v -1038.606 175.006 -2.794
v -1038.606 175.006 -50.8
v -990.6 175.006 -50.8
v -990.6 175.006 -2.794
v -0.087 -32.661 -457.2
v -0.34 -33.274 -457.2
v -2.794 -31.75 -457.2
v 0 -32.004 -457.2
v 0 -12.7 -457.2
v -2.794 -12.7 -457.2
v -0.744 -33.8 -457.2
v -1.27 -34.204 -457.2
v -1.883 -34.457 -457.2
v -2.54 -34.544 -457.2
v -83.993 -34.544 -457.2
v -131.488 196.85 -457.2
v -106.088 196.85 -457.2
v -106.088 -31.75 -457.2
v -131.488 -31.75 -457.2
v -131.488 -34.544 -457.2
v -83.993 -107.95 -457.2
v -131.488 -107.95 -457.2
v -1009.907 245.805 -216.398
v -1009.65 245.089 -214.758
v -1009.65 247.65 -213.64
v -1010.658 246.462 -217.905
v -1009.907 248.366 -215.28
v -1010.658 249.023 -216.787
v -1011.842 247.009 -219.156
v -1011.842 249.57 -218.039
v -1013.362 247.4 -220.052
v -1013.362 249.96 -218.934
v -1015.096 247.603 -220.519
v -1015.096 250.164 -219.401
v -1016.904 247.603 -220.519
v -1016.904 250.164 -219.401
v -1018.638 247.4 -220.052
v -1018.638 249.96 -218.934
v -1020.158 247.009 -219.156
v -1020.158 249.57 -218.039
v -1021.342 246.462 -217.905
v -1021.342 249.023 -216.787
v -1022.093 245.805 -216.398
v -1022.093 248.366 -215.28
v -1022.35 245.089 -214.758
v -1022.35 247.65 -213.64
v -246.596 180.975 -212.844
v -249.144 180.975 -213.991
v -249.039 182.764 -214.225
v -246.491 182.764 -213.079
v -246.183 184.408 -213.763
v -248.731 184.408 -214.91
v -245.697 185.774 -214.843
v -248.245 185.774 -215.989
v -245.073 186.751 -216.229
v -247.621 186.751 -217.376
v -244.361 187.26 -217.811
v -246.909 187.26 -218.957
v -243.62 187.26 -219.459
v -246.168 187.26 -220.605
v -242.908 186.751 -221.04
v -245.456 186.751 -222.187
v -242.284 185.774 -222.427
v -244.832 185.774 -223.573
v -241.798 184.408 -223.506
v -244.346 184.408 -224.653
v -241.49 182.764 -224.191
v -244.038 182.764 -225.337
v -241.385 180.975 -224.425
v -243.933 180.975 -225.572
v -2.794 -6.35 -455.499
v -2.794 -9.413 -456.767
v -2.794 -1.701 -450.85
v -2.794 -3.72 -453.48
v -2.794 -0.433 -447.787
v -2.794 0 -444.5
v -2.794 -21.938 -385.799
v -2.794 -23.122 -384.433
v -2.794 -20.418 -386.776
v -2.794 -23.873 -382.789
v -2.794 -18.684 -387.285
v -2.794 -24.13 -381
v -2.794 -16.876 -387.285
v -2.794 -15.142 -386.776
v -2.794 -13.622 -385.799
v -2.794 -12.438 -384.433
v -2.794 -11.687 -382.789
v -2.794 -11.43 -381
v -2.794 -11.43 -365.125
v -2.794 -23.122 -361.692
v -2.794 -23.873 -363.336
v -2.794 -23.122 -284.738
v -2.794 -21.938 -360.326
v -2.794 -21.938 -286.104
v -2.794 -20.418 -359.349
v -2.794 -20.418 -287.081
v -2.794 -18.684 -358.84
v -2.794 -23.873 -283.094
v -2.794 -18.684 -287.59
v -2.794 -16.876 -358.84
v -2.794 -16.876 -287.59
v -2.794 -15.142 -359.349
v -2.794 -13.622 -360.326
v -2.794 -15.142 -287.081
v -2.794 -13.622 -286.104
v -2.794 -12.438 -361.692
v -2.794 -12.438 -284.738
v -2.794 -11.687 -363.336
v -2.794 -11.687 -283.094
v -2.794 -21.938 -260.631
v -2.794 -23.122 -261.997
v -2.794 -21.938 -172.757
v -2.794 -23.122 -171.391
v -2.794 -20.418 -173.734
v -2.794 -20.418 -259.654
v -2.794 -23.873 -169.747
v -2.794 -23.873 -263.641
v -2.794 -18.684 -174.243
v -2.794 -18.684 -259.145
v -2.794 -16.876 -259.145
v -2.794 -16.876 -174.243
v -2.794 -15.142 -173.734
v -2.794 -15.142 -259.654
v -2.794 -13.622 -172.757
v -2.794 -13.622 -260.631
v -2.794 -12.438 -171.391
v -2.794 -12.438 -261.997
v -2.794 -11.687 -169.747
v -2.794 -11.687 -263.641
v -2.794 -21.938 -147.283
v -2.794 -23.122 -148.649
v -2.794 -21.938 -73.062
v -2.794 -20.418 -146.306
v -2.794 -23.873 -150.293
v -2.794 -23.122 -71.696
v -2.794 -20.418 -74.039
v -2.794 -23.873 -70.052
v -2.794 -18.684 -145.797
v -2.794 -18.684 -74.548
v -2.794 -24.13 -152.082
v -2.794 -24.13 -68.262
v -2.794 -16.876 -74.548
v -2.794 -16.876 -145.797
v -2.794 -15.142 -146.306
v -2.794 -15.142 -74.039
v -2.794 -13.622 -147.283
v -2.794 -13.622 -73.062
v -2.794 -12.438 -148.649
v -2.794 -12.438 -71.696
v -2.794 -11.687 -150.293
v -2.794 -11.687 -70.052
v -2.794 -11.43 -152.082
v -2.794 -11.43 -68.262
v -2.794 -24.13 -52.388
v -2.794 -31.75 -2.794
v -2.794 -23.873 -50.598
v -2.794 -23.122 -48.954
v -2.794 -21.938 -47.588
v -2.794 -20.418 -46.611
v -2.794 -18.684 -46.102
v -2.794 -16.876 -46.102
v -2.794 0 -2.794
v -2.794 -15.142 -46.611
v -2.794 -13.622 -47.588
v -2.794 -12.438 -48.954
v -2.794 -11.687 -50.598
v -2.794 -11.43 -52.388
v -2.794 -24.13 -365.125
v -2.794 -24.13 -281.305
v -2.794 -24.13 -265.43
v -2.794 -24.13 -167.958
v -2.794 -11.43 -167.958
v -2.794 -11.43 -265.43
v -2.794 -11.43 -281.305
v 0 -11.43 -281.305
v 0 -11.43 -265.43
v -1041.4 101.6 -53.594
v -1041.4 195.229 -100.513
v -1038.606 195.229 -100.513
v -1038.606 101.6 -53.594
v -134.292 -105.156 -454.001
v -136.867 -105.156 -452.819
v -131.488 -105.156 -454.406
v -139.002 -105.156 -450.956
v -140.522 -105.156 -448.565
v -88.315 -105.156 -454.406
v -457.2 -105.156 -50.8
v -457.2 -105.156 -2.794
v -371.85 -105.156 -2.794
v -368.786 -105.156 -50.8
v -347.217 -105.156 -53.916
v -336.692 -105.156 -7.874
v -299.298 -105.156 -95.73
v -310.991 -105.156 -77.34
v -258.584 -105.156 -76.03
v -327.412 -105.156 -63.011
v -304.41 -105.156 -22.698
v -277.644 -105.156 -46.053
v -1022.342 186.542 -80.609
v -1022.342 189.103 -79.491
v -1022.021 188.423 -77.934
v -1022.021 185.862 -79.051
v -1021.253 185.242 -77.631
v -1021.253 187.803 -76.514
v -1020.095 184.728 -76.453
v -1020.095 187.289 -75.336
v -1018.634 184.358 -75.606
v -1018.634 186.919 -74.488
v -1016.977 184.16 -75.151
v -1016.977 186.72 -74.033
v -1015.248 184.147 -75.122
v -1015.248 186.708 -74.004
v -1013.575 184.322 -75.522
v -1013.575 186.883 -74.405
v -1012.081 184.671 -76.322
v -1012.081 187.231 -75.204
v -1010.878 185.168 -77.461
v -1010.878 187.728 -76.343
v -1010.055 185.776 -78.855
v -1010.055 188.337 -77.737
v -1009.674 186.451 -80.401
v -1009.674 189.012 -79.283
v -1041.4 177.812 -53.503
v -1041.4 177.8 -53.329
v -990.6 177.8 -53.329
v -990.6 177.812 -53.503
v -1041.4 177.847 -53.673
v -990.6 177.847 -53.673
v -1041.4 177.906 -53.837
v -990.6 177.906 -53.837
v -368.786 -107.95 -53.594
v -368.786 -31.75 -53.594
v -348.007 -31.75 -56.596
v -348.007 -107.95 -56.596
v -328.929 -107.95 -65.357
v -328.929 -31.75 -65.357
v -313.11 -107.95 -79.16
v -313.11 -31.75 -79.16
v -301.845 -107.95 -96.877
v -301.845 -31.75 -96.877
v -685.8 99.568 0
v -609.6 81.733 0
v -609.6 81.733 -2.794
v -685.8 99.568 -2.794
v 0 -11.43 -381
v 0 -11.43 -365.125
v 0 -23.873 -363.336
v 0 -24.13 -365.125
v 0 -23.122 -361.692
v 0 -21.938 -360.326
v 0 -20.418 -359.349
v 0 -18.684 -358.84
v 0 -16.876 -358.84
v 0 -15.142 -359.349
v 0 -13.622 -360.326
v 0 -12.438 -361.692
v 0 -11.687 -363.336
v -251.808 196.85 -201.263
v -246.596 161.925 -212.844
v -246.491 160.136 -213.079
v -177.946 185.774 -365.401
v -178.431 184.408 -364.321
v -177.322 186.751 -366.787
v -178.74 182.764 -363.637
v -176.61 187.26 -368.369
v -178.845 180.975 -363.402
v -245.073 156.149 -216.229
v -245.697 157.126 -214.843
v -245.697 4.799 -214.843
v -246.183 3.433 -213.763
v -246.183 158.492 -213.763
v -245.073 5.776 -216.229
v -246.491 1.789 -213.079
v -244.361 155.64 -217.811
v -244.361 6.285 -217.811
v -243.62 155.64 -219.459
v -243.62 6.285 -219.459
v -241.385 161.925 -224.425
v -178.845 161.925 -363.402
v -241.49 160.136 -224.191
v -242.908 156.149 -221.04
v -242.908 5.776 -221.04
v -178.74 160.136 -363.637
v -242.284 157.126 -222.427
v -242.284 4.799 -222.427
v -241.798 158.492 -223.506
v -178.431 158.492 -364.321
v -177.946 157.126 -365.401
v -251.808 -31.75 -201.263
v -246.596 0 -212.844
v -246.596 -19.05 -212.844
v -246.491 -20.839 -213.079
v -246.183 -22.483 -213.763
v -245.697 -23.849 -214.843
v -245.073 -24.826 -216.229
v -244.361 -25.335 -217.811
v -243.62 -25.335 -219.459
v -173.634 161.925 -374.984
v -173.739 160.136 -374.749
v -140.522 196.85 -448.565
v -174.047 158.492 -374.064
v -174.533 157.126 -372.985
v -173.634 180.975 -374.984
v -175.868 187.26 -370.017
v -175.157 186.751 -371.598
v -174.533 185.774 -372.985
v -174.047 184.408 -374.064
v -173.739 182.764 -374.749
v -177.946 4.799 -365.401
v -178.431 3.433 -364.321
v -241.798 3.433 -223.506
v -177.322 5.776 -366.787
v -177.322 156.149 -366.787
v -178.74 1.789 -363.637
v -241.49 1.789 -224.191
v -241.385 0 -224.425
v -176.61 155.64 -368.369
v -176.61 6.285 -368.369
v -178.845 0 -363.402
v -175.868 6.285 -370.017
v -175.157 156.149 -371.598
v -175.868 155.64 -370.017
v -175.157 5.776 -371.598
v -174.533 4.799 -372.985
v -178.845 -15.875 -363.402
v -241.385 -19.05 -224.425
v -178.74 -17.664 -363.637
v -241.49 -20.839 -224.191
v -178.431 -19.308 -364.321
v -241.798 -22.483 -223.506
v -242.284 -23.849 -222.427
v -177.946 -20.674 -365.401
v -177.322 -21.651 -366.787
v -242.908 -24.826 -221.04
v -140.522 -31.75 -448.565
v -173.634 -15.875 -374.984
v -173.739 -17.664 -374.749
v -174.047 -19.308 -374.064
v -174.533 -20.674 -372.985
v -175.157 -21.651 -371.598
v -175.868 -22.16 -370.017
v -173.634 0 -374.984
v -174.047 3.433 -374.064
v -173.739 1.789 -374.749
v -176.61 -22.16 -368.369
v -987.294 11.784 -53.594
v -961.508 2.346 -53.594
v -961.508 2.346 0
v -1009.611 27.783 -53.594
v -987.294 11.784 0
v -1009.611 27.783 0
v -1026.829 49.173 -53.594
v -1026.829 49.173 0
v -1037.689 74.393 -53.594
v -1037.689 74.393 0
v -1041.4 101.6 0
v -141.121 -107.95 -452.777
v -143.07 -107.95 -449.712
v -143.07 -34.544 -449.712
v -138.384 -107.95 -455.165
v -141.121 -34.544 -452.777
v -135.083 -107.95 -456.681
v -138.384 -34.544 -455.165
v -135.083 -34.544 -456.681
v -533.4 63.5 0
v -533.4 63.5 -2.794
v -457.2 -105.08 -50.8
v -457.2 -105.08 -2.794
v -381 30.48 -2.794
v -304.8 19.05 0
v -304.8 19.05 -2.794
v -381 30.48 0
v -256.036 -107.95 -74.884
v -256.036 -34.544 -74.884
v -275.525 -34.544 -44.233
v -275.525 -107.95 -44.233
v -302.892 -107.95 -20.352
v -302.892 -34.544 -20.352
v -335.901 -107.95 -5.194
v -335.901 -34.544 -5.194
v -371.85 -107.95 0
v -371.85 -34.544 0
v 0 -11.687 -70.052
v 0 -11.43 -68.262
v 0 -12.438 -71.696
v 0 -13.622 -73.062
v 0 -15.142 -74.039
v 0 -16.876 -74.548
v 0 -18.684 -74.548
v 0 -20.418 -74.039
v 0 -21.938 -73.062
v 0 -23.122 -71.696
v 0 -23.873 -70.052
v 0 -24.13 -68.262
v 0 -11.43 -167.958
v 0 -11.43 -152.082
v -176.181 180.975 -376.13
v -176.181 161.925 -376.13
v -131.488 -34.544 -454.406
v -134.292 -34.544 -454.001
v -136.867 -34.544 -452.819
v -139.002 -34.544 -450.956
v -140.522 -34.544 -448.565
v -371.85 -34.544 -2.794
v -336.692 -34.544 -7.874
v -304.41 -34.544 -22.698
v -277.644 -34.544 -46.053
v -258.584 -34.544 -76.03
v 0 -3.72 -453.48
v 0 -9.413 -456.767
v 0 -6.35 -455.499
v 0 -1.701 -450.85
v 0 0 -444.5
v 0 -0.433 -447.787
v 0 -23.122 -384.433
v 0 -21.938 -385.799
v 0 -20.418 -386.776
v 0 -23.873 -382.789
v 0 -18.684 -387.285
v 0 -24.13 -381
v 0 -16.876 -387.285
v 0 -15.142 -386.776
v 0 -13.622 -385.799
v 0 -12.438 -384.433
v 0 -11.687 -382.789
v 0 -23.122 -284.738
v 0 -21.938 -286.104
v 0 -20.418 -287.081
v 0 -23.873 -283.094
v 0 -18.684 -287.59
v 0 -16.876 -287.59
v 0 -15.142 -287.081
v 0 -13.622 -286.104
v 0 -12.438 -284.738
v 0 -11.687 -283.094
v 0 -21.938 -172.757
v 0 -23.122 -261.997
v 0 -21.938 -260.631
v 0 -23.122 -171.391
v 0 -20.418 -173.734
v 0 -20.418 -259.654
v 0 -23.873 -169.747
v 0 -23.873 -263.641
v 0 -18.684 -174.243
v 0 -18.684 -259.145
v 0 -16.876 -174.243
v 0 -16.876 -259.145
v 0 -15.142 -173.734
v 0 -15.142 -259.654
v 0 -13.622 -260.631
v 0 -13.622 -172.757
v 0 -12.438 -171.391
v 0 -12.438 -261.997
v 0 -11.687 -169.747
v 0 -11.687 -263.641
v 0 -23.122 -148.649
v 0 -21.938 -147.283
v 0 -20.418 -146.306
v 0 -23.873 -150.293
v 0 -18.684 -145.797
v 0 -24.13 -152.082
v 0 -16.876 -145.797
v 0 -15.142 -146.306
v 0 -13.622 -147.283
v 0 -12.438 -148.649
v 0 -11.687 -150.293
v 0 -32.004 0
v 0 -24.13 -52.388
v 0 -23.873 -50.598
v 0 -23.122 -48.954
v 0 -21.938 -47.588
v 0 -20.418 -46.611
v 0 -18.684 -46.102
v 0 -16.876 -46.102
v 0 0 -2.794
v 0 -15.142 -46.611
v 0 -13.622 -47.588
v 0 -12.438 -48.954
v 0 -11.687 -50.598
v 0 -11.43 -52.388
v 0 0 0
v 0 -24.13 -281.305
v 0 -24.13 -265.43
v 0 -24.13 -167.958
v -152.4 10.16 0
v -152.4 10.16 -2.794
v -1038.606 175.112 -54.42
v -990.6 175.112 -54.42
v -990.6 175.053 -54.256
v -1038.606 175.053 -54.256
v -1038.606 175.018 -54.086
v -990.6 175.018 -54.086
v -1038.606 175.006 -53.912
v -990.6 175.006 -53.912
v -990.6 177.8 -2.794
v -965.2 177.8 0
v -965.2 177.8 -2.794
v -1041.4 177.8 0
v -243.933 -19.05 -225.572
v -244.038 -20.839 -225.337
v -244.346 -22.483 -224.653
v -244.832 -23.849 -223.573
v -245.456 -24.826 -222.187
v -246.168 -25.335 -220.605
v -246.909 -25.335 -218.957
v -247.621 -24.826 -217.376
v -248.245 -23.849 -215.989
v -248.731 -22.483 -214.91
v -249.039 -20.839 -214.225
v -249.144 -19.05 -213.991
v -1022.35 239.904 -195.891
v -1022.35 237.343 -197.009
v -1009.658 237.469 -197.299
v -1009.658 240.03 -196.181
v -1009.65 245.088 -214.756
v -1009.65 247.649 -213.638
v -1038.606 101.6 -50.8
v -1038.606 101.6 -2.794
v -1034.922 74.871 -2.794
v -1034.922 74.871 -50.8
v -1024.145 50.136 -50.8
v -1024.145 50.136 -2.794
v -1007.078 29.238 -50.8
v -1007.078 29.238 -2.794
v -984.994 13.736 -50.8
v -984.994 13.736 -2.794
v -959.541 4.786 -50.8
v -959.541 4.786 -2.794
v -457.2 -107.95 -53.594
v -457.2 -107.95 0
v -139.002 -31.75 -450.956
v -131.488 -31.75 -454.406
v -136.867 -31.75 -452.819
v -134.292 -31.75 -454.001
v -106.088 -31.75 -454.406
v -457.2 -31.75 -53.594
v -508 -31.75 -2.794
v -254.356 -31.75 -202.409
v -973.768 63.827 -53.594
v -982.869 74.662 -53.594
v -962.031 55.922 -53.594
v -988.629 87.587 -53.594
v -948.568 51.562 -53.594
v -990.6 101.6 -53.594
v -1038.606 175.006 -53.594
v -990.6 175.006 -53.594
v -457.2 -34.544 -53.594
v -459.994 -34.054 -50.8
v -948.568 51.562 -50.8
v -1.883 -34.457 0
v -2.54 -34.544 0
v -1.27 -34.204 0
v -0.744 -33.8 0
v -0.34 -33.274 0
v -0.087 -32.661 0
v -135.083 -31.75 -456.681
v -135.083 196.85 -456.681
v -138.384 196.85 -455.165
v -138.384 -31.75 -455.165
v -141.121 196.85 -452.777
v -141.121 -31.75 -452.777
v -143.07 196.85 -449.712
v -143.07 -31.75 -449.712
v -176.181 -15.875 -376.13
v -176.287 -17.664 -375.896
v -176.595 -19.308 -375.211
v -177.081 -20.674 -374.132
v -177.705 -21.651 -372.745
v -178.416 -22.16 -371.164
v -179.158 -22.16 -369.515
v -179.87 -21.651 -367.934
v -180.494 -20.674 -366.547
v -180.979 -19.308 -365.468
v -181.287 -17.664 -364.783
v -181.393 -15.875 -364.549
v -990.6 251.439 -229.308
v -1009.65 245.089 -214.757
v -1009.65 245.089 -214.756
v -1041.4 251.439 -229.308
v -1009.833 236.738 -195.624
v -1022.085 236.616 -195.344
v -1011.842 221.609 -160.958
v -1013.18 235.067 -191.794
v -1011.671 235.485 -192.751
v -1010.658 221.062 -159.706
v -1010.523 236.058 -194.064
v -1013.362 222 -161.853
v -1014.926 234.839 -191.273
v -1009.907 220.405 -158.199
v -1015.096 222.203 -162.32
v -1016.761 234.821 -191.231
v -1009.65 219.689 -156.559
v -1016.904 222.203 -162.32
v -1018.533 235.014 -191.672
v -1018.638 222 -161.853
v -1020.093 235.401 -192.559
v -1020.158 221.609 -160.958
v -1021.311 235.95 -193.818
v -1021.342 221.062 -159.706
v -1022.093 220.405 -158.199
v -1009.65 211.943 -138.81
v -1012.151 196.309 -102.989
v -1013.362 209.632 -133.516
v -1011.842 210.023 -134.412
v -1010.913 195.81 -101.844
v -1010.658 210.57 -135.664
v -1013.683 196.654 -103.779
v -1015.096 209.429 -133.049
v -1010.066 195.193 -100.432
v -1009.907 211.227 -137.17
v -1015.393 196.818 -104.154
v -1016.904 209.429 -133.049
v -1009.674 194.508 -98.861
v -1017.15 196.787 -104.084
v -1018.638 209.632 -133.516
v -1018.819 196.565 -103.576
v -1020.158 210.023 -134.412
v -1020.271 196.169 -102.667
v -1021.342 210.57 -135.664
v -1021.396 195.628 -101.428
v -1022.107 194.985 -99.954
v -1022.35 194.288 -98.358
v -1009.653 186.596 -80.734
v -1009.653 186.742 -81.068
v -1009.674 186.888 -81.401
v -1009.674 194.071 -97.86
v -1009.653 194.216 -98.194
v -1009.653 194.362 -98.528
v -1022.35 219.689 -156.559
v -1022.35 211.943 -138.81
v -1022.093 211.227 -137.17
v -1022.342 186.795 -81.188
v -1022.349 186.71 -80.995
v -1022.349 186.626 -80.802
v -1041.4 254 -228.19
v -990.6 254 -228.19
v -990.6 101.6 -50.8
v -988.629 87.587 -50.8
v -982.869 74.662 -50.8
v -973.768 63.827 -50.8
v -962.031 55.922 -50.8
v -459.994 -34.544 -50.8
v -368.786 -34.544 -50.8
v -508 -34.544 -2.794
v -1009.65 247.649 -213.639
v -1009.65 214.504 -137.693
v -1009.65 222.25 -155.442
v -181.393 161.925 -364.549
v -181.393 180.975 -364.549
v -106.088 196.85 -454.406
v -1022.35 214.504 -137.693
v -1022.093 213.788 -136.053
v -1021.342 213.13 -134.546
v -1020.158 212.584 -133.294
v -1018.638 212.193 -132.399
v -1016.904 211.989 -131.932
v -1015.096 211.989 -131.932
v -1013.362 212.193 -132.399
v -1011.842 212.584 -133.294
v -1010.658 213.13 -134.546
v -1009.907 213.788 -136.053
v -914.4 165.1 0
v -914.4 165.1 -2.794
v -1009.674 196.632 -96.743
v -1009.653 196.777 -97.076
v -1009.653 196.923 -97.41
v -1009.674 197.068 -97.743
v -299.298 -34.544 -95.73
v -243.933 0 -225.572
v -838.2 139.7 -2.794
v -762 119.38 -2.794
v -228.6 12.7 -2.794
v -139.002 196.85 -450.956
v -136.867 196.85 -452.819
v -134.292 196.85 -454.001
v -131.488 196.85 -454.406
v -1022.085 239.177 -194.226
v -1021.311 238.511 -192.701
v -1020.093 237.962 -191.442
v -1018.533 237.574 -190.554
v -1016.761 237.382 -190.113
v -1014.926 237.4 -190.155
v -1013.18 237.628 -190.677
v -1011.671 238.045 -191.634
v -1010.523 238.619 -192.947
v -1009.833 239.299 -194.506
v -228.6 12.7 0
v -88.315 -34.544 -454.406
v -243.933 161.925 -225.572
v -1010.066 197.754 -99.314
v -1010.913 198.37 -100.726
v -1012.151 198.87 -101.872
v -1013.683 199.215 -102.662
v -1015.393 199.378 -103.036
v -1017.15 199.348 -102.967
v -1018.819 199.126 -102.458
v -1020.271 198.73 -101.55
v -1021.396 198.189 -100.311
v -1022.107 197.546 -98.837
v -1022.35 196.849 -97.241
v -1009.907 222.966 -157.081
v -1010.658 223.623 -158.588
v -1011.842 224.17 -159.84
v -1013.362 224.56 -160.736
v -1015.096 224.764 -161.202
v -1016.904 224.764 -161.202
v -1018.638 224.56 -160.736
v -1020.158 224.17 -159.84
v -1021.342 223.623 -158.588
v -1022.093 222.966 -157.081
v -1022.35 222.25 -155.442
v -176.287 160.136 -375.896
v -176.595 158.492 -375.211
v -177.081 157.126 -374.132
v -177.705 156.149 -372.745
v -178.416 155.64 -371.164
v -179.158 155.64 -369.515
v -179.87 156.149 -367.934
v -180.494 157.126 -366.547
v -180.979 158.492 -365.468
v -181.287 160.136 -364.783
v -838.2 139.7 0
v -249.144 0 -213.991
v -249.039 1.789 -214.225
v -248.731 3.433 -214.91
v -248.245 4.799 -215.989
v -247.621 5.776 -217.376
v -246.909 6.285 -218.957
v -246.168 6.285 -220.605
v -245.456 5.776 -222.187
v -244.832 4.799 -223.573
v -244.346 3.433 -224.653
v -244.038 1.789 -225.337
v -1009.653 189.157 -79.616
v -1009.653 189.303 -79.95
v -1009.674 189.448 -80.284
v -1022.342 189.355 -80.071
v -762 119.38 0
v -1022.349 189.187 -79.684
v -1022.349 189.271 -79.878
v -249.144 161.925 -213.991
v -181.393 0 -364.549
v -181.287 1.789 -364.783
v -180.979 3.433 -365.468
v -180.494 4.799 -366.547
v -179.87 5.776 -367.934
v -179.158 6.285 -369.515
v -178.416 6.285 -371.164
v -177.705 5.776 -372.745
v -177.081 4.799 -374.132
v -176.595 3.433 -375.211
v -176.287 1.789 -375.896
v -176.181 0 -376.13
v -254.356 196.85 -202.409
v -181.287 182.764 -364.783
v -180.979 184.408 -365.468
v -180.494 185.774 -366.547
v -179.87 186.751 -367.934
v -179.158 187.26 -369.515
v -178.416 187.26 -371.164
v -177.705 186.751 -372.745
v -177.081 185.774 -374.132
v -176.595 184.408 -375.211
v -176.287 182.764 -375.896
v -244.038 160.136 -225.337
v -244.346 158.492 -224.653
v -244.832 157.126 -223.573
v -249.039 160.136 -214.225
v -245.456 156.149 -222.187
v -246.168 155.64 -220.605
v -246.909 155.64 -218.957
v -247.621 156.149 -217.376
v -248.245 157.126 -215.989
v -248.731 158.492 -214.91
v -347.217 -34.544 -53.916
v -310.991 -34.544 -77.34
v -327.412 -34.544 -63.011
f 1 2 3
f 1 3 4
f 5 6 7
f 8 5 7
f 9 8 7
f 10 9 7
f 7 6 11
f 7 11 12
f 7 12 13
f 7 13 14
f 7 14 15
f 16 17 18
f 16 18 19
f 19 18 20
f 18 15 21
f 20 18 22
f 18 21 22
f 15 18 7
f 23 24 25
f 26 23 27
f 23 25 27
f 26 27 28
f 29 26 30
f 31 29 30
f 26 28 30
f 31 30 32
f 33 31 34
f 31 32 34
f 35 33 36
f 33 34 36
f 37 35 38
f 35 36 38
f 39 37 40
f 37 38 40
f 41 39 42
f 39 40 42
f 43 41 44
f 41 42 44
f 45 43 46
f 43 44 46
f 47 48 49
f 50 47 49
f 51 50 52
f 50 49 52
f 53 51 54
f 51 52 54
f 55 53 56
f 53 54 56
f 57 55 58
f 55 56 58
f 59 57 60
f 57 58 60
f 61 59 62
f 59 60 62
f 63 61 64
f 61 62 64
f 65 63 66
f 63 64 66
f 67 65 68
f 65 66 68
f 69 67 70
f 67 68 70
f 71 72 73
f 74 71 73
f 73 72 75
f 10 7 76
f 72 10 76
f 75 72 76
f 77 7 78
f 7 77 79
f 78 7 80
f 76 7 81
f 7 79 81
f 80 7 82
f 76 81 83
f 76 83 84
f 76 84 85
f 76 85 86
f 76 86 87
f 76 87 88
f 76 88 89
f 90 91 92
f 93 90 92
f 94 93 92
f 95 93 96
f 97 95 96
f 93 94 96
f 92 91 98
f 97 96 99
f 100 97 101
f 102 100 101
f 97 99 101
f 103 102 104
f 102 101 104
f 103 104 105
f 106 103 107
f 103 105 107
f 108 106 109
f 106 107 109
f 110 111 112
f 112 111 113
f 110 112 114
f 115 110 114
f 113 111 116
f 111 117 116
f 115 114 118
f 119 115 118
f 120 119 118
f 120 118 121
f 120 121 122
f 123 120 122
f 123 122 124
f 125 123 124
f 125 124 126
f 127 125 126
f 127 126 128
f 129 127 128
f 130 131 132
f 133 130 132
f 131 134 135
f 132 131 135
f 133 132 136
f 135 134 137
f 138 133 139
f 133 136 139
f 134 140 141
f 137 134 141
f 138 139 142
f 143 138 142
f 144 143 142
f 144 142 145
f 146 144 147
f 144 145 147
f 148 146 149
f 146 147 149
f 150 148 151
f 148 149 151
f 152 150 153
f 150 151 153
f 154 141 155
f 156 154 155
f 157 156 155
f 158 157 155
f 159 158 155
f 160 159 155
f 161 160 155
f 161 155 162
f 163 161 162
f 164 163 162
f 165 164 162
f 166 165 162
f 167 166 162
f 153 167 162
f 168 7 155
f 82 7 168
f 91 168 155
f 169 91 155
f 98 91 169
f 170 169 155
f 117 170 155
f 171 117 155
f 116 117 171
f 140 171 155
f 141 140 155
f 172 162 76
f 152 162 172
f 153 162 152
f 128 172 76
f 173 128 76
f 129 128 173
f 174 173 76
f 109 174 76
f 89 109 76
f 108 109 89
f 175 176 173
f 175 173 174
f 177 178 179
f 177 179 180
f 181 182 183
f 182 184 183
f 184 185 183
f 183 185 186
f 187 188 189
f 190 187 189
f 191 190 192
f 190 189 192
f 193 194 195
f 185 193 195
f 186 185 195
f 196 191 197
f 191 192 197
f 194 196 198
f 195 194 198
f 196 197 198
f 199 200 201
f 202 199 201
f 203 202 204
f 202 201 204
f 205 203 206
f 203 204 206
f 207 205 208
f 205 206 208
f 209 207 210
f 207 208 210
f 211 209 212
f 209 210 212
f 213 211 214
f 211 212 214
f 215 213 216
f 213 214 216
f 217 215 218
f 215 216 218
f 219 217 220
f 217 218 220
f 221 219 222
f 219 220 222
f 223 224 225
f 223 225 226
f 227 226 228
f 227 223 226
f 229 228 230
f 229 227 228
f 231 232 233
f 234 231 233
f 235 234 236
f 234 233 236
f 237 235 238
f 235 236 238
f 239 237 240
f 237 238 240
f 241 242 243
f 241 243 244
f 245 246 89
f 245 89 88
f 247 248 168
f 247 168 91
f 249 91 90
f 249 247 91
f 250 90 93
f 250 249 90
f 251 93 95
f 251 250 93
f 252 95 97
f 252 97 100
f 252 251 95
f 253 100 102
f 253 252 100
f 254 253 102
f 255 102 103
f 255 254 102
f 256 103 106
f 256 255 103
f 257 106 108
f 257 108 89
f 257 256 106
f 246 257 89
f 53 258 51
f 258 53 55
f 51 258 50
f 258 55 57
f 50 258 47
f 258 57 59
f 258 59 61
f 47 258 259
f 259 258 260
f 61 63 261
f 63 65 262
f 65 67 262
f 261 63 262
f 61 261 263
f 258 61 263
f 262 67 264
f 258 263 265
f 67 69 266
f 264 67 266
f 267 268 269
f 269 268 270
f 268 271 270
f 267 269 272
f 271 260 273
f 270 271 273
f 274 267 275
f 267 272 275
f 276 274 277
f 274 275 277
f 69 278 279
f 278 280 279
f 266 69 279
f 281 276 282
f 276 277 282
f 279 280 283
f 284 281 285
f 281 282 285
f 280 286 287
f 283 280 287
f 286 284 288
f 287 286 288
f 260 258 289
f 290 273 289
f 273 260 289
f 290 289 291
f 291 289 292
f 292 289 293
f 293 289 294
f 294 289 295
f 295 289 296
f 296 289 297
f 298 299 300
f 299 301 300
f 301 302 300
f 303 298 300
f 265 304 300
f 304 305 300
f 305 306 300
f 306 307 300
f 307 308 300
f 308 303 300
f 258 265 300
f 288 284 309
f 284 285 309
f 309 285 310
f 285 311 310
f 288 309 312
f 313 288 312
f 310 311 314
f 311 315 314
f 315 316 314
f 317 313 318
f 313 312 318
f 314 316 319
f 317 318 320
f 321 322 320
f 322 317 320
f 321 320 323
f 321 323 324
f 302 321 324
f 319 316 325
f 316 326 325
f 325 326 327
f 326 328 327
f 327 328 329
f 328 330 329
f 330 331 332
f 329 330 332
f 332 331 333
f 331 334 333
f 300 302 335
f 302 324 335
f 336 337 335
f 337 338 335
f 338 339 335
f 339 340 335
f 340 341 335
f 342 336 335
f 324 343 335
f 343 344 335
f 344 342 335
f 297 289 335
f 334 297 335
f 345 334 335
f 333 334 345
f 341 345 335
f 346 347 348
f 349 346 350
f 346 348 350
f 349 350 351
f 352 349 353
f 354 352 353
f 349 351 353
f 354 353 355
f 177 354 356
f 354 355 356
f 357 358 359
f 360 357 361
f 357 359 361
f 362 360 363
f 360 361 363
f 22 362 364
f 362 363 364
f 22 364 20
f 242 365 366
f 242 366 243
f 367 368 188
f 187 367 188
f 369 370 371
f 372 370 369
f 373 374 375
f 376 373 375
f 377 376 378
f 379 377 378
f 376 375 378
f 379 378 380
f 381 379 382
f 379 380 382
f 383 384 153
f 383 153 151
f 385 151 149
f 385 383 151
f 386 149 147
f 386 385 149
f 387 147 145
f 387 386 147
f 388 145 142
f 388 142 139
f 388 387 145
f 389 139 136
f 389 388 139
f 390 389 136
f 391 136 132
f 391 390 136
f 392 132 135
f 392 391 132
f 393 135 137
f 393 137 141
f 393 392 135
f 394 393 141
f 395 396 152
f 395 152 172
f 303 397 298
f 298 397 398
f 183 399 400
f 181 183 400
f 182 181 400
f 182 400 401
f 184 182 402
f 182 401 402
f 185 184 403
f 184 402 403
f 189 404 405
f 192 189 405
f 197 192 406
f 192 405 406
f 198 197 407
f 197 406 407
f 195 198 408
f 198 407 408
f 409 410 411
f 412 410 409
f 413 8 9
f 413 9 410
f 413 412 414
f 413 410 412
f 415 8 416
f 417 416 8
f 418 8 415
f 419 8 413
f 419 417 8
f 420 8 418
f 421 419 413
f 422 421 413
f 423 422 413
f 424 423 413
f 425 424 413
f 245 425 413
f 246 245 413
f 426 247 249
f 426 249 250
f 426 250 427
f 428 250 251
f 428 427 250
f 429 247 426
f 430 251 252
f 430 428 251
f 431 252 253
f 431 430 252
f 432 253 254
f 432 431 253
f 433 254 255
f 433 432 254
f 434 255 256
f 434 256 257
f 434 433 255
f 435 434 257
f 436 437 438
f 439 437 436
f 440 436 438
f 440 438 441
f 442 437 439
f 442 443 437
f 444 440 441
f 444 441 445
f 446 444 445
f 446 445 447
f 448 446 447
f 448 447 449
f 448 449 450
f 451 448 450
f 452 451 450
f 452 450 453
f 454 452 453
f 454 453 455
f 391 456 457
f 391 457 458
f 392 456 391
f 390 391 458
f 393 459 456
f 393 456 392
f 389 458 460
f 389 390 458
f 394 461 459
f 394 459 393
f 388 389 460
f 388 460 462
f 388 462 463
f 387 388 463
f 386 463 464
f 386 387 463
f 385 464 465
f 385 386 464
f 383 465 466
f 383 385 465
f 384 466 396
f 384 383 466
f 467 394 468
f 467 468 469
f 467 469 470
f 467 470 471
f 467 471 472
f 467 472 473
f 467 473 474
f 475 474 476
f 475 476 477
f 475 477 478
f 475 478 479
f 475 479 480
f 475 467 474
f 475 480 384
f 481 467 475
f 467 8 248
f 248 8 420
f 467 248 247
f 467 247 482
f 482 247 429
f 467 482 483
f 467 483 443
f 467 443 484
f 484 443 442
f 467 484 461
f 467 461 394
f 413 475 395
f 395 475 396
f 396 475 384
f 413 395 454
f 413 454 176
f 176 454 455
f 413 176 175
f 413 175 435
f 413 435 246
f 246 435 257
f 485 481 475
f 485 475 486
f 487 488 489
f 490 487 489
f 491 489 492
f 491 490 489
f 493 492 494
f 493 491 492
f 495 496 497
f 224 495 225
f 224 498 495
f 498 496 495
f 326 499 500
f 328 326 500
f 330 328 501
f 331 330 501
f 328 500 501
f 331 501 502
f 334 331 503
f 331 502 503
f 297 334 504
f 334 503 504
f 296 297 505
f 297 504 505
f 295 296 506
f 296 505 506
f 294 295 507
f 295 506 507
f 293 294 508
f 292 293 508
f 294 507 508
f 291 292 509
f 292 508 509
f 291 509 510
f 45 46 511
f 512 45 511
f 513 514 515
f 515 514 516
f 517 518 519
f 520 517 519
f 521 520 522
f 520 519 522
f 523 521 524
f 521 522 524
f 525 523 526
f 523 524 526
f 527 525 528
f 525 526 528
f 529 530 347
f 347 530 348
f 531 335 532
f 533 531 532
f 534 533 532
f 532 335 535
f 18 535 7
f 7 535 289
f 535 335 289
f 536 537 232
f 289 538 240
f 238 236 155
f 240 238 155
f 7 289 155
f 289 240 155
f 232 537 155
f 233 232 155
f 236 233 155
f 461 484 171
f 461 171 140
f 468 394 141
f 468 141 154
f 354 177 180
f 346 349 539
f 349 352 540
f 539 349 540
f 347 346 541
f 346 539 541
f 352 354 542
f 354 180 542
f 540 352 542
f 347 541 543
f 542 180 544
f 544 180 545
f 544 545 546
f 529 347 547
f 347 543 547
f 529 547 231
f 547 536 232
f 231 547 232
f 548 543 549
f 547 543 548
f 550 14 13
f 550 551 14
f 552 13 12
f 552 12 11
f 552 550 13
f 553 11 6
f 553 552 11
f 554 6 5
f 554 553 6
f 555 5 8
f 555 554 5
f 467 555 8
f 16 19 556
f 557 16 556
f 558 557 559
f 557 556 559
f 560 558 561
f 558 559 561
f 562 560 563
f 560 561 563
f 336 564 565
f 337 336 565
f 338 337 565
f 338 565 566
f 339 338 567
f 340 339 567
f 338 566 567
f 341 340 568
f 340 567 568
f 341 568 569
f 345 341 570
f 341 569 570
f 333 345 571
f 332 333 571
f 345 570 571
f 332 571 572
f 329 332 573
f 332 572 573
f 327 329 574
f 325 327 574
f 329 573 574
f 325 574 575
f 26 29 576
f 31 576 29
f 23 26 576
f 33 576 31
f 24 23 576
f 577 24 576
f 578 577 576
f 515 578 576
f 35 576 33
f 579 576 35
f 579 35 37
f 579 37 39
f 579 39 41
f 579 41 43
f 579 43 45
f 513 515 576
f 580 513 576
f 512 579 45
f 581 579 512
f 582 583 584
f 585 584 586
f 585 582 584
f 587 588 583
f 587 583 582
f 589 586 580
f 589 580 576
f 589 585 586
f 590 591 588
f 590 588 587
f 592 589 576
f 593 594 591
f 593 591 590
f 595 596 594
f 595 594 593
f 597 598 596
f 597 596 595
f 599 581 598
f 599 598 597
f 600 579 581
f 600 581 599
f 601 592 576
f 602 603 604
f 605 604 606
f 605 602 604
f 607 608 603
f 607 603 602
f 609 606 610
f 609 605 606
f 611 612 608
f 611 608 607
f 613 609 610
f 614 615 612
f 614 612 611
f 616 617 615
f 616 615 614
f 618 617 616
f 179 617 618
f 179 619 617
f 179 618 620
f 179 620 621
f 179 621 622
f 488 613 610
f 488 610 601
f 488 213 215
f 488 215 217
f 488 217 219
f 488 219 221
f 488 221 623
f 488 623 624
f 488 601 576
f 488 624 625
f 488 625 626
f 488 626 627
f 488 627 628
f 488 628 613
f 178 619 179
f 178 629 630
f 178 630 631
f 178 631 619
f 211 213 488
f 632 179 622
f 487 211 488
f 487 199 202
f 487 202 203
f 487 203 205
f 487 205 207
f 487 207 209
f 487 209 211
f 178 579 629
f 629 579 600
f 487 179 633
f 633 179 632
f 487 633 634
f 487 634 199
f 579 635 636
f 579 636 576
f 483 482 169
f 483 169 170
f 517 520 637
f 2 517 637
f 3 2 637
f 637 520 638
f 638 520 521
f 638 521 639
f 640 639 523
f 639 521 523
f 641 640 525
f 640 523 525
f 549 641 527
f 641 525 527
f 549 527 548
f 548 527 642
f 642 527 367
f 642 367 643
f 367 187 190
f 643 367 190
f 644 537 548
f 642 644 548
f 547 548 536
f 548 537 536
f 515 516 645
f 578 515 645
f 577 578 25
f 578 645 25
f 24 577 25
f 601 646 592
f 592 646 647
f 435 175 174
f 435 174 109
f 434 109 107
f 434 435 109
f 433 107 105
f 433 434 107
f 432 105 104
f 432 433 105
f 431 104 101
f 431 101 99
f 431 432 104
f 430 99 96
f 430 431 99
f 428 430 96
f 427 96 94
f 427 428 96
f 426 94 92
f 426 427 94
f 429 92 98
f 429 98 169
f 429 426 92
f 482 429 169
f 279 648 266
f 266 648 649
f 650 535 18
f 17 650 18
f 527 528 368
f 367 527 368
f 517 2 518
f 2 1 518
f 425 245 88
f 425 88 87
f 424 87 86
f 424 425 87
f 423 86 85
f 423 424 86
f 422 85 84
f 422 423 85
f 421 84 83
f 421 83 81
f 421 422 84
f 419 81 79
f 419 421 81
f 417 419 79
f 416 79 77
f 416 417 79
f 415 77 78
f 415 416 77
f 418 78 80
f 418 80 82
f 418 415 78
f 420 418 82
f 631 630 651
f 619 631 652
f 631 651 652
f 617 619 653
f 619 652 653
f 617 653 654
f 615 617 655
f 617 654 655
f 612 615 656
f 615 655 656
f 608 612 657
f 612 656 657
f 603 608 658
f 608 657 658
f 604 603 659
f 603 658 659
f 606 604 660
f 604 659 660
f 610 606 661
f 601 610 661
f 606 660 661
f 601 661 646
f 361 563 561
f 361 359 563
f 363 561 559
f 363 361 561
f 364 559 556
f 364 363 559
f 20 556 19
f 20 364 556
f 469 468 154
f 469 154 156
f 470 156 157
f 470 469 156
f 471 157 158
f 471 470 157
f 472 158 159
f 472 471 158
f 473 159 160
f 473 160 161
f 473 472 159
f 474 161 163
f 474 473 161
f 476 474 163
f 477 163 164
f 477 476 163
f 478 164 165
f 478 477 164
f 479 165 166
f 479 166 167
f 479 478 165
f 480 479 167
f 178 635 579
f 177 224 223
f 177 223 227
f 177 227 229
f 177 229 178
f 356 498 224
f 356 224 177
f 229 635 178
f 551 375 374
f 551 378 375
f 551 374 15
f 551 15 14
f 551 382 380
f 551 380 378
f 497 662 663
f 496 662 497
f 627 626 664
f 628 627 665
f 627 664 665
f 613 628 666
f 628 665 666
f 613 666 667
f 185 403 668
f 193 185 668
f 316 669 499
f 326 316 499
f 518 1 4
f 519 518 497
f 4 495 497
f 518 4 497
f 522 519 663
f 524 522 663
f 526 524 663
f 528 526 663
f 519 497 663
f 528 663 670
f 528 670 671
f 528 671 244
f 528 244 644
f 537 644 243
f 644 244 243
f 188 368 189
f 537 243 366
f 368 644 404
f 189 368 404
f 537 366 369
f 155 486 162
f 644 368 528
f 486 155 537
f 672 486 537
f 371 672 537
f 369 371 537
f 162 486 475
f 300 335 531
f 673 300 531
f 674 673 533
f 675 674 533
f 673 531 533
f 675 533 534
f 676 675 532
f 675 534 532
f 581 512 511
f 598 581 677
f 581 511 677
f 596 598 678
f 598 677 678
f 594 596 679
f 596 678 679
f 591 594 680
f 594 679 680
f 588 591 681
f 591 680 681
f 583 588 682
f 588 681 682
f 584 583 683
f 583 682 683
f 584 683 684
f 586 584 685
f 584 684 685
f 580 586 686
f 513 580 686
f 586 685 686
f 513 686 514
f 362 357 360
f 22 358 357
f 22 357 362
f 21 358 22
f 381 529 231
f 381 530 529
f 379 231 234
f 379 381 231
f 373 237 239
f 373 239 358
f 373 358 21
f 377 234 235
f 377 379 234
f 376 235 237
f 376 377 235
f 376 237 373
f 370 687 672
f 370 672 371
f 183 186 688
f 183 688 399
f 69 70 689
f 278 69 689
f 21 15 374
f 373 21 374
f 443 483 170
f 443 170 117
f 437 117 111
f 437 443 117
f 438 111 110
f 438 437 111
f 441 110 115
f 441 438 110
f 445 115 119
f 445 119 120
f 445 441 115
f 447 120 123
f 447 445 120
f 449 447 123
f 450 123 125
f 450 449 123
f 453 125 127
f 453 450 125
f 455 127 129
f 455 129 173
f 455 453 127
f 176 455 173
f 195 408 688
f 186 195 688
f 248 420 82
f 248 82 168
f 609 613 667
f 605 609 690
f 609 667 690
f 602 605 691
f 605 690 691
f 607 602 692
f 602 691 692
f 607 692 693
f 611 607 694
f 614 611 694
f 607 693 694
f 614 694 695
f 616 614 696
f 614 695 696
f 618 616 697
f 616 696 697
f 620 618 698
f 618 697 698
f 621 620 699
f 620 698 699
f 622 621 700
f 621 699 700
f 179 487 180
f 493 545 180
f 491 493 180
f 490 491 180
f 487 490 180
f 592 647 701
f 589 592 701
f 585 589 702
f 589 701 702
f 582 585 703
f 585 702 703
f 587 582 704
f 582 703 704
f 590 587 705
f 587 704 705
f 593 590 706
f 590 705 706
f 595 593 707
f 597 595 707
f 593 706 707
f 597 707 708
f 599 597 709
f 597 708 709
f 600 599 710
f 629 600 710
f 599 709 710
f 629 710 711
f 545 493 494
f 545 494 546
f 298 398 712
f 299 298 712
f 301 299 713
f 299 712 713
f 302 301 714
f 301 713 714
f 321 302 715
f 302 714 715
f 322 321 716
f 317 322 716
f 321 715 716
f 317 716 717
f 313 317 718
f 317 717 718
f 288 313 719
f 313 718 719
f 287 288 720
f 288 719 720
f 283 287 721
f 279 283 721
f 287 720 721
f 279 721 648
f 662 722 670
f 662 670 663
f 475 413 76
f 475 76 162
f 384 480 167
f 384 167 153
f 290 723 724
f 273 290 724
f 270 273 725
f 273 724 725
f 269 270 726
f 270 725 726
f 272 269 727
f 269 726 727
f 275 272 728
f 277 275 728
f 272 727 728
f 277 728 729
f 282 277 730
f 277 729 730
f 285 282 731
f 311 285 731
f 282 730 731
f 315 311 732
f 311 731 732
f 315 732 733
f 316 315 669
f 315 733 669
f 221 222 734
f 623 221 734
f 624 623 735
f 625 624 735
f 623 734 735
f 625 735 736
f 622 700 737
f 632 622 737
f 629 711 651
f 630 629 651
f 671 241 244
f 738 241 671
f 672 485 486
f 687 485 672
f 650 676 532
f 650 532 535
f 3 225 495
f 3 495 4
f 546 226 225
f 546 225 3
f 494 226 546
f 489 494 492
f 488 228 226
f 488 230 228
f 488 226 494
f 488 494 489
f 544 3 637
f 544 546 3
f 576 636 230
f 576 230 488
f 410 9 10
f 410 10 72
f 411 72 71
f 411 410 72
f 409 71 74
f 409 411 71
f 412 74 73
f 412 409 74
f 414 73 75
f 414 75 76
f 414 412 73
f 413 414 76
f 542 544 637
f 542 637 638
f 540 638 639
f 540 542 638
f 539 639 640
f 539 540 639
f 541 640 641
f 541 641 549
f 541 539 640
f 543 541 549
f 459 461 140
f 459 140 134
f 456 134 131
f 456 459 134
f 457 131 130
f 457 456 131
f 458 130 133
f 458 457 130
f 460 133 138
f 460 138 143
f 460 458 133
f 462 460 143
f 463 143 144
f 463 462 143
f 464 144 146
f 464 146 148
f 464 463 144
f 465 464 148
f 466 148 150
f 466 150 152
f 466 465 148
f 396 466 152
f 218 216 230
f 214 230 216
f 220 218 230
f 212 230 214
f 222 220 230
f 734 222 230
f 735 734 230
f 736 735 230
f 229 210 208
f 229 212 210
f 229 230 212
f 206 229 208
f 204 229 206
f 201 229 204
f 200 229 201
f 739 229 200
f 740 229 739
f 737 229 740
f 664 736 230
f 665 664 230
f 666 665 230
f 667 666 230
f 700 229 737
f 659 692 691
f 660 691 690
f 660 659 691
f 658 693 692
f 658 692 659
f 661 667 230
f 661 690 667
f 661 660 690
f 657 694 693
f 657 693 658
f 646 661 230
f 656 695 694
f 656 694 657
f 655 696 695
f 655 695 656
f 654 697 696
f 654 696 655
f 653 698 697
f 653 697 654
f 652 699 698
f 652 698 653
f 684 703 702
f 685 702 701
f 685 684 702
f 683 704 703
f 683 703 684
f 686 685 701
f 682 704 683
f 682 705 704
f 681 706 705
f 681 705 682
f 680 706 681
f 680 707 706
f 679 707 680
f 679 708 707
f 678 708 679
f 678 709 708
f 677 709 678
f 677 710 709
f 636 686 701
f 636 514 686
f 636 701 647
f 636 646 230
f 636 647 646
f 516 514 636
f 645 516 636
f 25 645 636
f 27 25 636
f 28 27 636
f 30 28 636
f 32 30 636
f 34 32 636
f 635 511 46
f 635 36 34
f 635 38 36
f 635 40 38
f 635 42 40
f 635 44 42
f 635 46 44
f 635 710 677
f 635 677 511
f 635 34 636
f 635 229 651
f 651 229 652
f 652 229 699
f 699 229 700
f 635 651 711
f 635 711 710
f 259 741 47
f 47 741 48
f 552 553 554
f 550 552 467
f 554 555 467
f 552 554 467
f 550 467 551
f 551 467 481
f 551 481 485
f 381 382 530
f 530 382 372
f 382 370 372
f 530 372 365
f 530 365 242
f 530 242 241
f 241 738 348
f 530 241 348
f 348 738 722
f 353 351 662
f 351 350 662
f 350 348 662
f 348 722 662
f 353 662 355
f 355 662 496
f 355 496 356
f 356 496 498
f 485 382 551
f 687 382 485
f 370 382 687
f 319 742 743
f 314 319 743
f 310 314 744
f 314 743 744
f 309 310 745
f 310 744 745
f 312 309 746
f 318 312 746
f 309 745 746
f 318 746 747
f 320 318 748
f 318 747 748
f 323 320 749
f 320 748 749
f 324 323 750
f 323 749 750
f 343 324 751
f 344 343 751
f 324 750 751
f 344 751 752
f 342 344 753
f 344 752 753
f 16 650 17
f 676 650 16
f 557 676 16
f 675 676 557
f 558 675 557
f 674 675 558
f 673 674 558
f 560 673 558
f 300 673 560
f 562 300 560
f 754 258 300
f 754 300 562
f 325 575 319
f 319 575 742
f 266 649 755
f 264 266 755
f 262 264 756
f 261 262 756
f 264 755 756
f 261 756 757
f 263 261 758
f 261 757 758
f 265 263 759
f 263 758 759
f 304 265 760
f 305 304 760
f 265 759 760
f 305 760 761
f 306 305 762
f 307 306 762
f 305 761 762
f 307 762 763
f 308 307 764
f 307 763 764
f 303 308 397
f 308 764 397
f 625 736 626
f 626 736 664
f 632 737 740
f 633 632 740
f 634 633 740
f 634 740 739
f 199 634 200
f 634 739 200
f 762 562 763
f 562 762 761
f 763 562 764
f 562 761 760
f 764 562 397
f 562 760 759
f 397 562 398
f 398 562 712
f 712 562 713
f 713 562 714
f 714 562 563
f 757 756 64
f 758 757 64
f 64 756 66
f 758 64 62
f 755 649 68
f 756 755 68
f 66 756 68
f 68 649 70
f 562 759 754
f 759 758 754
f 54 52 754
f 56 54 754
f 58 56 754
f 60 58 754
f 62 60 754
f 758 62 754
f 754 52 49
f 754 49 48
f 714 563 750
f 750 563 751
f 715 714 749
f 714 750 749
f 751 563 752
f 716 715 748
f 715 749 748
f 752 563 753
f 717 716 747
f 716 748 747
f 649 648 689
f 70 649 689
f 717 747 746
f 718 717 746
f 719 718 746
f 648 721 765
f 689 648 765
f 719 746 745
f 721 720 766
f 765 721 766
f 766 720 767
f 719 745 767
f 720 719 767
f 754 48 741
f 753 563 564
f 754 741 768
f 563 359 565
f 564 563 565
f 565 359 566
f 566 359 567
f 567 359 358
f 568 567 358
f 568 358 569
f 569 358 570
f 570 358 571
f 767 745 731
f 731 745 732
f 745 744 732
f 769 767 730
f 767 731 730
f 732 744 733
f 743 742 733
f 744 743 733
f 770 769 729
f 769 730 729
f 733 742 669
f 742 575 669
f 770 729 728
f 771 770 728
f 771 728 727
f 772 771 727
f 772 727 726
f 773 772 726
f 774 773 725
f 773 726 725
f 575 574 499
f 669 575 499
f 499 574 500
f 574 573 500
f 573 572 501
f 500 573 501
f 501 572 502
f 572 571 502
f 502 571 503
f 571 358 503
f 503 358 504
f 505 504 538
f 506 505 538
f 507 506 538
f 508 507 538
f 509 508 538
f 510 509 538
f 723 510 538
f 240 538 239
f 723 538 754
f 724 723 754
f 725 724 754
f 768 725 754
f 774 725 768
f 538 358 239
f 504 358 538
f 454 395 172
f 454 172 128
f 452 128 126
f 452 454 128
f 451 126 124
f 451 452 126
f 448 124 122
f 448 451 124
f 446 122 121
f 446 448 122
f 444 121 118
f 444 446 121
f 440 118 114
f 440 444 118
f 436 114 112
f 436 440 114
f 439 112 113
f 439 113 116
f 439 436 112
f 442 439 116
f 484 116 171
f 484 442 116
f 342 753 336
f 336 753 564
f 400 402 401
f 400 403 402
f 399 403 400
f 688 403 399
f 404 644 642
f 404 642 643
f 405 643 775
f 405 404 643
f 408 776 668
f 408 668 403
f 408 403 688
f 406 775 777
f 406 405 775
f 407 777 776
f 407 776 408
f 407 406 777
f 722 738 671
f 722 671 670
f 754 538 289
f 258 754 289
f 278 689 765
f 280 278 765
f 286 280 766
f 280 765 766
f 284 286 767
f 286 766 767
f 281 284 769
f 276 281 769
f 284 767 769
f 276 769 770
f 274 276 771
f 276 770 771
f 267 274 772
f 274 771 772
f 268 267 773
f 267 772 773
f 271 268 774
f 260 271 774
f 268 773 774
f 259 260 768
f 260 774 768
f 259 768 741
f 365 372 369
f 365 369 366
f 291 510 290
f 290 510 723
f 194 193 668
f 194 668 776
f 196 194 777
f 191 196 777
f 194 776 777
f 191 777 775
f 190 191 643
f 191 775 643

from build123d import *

# Parameters (mm, degrees)
F1_DEPTH  = 2.794
F3_DEPTH  = 50.8
F5_DEPTH  = 25.4
F7_DEPTH  = 50.8
F9_DEPTH  = 2.794
F11_DEPTH = 2.794
F12_R     = 12.7
F14_DEPTH = 73.406
F16_DEPTH = 2.794
F19_DEPTH = 70.612
F20_DEPTH = 2.794
F22_DEPTH = 2.794
F24_DEPTH = 228.6
F26_DEPTH = 25.4
F27_R     = 2.54


with BuildPart() as f1:
    # F0 (on Top) → F1 (new body)
    with BuildSketch(Plane.XY):
        with BuildLine():
            Line((-965.2, 177.8), (-1041.4, 177.8))
            Line((-1041.4, 177.8), (-1041.4, 101.6))
            ThreePointArc((-1041.4, 101.6), (-1018.9456069551, 37.8933841763), (-961.5076200844, 2.3460870783))
            Line((-961.5076200844, 2.3460870783), (-457.2, -107.95))
            Line((-457.2, -107.95), (-457.2, -31.75))
            Line((-457.2, -31.75), (0, -31.75))
            Line((0, -31.75), (0, 0))
            Line((0, 0), (-76.2, 5.08))
            Line((-76.2, 5.08), (-152.4, 10.16))
            Line((-152.4, 10.16), (-228.6, 12.7))
            Line((-228.6, 12.7), (-304.8, 19.05))
            Line((-304.8, 19.05), (-381, 30.48))
            Line((-381, 30.48), (-457.2, 46.99))
            Line((-457.2, 46.99), (-533.4, 63.5))
            Line((-533.4, 63.5), (-609.6, 81.7329064012))
            Line((-609.6, 81.7329064012), (-685.8, 99.568))
            Line((-685.8, 99.568), (-762, 119.38))
            Line((-762, 119.38), (-838.2, 139.7))
            Line((-838.2, 139.7), (-914.4, 165.1))
            Line((-914.4, 165.1), (-965.2, 177.8))
        make_face()
    extrude(amount=-F1_DEPTH)

    # F2 (on face) → F3 (join)
    with BuildSketch(Plane(origin=(-1041.4, 0, 0), x_dir=(0, -1, 0), z_dir=(-1, 0, 0))):
        with BuildLine():
            Line((-175.006, -2.794), (-177.8, -2.794))
            Line((-177.8, -2.794), (-177.8, -53.3289355663))
            ThreePointArc((-177.8, -53.3289355663), (-177.8267889826, -53.5884088138), (-177.9060257735, -53.8369355663))
            Line((-177.9060257735, -53.8369355663), (-254, -228.1901339778))
            Line((-254, -228.1901339778), (-251.4392567017, -229.3077339778))
            Line((-251.4392567017, -229.3077339778), (-175.1120257735, -54.4200773204))
            ThreePointArc((-175.1120257735, -54.4200773204), (-175.0327889826, -54.1715505679), (-175.006, -53.9120773204))
            Line((-175.006, -53.9120773204), (-175.006, -2.794))
        make_face()
    extrude(amount=-F3_DEPTH)

    # F4 (on face) → F5 (cut)
    with BuildSketch(Plane(origin=(0, 129.7041150564, 56.6075166851), x_dir=(-1, 0, 0), z_dir=(0, 0.916515139, 0.4))):
        with BuildLine():
            Line((1022.3420024451, -148.4961138868), (1022.3422634072, -149.1280729728))
            ThreePointArc((1022.3422634072, -149.1280729728), (1022.3499994586, -148.8120901814), (1022.3420024451, -148.4961138868))
        make_face()
        with BuildLine():
            Line((1022.3499994586, -167.8620901814), (1022.3422634072, -149.1280729728))
            Line((1022.3422634072, -149.1280729728), (1022.3420024451, -148.4961138868))
            ThreePointArc((1022.3420024451, -148.4961138868), (1016.1138654081, -142.4657333334), (1009.6735000791, -148.2689113418))
            Line((1009.6735000791, -148.2689113418), (1009.6735000791, -149.3605133763))
            Line((1009.6735000791, -149.3605133763), (1009.6735000791, -167.3189113418))
            Line((1009.6735000791, -167.3189113418), (1009.6735000791, -168.4105133763))
            ThreePointArc((1009.6735000791, -168.4105133763), (1016.2744632166, -174.2087780856), (1022.3499994586, -167.8620901814))
        make_face()
        with BuildLine():
            Line((1009.6735000791, -149.3605133763), (1009.6735000791, -148.2689113418))
            ThreePointArc((1009.6735000791, -148.2689113418), (1009.65, -148.8147123591), (1009.6735000791, -149.3605133763))
        make_face()
        with BuildLine():
            ThreePointArc((1009.6735000791, -167.3189113418), (1009.65, -167.8647123591), (1009.6735000791, -168.4105133763))
            Line((1009.6735000791, -168.4105133763), (1009.6735000791, -167.3189113418))
        make_face()
        with BuildLine():
            Line((1022.35, -231.3647123591), (1022.35, -211.9987344133))
            ThreePointArc((1022.35, -211.9987344133), (1016, -205.6487344133), (1009.65, -211.9987344133))
            Line((1009.65, -211.9987344133), (1009.65, -231.3647123591))
            ThreePointArc((1009.65, -231.3647123591), (1016, -237.7147123591), (1022.35, -231.3647123591))
        make_face()
        with BuildLine():
            Line((1022.35, -294.8647123591), (1022.35, -275.4987344133))
            ThreePointArc((1022.35, -275.4987344133), (1015.8419112498, -269.1507025965), (1009.6578715127, -275.8148139146))
            Line((1009.6578715127, -275.8148139146), (1009.6500005422, -294.862088327))
            ThreePointArc((1009.6500005422, -294.862088327), (1009.6500001355, -294.863400343), (1009.65, -294.8647123591))
            ThreePointArc((1009.65, -294.8647123591), (1016, -301.2147123591), (1022.35, -294.8647123591))
        make_face()
    extrude(amount=-F5_DEPTH, mode=Mode.SUBTRACT)

    # F6 (on face) → F7 (join)
    with BuildSketch(Plane(origin=(0, 0, -2.794), x_dir=(1, 0, 0), z_dir=(0, 0, -1))):
        with BuildLine():
            Line((-1041.4, -101.6), (-1041.4, -175.006))
            Line((-1041.4, -175.006), (-1038.606, -175.006))
            Line((-1038.606, -175.006), (-1038.606, -101.6))
            ThreePointArc((-1038.606, -101.6), (-1016.3281446314, -39.1014502946), (-959.5405846349, -4.7860807824))
            Line((-959.5405846349, -4.7860807824), (-457.2, 105.0798))
            Line((-457.2, 105.0798), (-457.2, 107.95))
            Line((-457.2, 107.95), (-961.5076200844, -2.3460870783))
            ThreePointArc((-961.5076200844, -2.3460870783), (-1018.9456069551, -37.8933841763), (-1041.4, -101.6))
        make_face()
    extrude(amount=F7_DEPTH)

    # F8 (on face) → F9 (join)
    with BuildSketch(Plane.XZ.offset(31.75)):
        with BuildLine():
            Line((0, -457.2), (0, 0))
            Line((0, 0), (-406.4, 0))
            Line((-406.4, 0), (-457.2, 0))
            Line((-457.2, 0), (-457.2, -2.794))
            Line((-457.2, -2.794), (-508, -2.794))
            Line((-508, -2.794), (-457.2, -53.594))
            Line((-457.2, -53.594), (-368.7859632857, -53.594))
            ThreePointArc((-368.7859632857, -53.594), (-328.9286236164, -65.3572120156), (-301.8454532768, -96.876770496))
            Line((-301.8454532768, -96.876770496), (-254, -203.2))
            Line((-254, -203.2), (-139.7, -457.2))
            Line((-139.7, -457.2), (0, -457.2))
        make_face()
    extrude(amount=F9_DEPTH)

    # F10 (on face) → F11 (join)
    with BuildSketch(Plane(origin=(-1041.4, 0, 0), x_dir=(0, -1, 0), z_dir=(-1, 0, 0))):
        with BuildLine():
            Line((-195.2287815157, -100.5133552833), (-101.6, -53.594))
            Line((-101.6, -53.594), (-175.006, -53.594))
            Line((-175.006, -53.594), (-175.006, -53.9120773204))
            ThreePointArc((-175.006, -53.9120773204), (-175.0327889826, -54.1715505679), (-175.1120257735, -54.4200773204))
            Line((-175.1120257735, -54.4200773204), (-195.2287815157, -100.5133552833))
        make_face()
    extrude(amount=-F11_DEPTH)

    # F12
    f12_edges = [f1.edges().sort_by_distance(p)[0] for p in [
        (-139.7, -33.147, -457.2),
    ]]
    fillet(f12_edges, radius=F12_R)

    # F13 (on face) → F14 (join)
    with BuildSketch(Plane.XZ.offset(34.544)):
        with BuildLine():
            Line((-371.8498234799, 0), (-457.2, 0))
            Line((-457.2, 0), (-457.2, -2.794))
            Line((-457.2, -2.794), (-371.8498234799, -2.794))
            ThreePointArc((-371.8498234799, -2.794), (-304.4095497834, -22.6978431683), (-258.5837010082, -76.0302448877))
            Line((-258.5837010082, -76.0302448877), (-87.0573112076, -457.2))
            Line((-87.0573112076, -457.2), (-83.9934510134, -457.2))
            Line((-83.9934510134, -457.2), (-256.0357923227, -74.8836859792))
            ThreePointArc((-256.0357923227, -74.8836859792), (-302.8924884119, -20.3515778817), (-371.8498234799, 0))
        make_face()
    extrude(amount=F14_DEPTH)

    # F15 (on face) → F16 (join)
    with BuildSketch(Plane.XZ.offset(107.95)):
        with BuildLine():
            Line((-371.8498234799, -2.794), (-457.2, -2.794))
            Line((-457.2, -2.794), (-457.2, -53.594))
            Line((-457.2, -53.594), (-368.7859632857, -53.594))
            ThreePointArc((-368.7859632857, -53.594), (-328.9286236164, -65.3572120156), (-301.8454532768, -96.876770496))
            Line((-301.8454532768, -96.876770496), (-143.0697658691, -449.7116314021))
            ThreePointArc((-143.0697658691, -449.7116314021), (-138.3840962601, -455.1648422118), (-131.4883627533, -457.2))
            Line((-131.4883627533, -457.2), (-87.0573112076, -457.2))
            Line((-87.0573112076, -457.2), (-258.5837010082, -76.0302448877))
            ThreePointArc((-258.5837010082, -76.0302448877), (-304.4095497834, -22.6978431683), (-371.8498234799, -2.794))
        make_face()
    extrude(amount=-F16_DEPTH)

    # F18 (on face) → F19 (join, through all)
    with BuildSketch(Plane.XZ.offset(34.544)):
        with BuildLine():
            Line((-131.4883627533, -457.2), (-87.0573112076, -457.2))
            Line((-87.0573112076, -457.2), (-88.3146112076, -454.406))
            Line((-88.3146112076, -454.406), (-131.4883627533, -454.406))
            ThreePointArc((-131.4883627533, -454.406), (-136.8670348886, -452.8185769252), (-140.5218571836, -448.5650724936))
            Line((-140.5218571836, -448.5650724936), (-299.2975445913, -95.7302115875))
            ThreePointArc((-299.2975445913, -95.7302115875), (-327.4115622449, -63.010946729), (-368.7859632857, -50.8))
            Line((-368.7859632857, -50.8), (-419.1, -50.8))
            Line((-419.1, -50.8), (-419.1, -53.594))
            Line((-419.1, -53.594), (-368.7859632857, -53.594))
            ThreePointArc((-368.7859632857, -53.594), (-328.9286236164, -65.3572120156), (-301.8454532768, -96.876770496))
            Line((-301.8454532768, -96.876770496), (-143.0697658691, -449.7116314021))
            ThreePointArc((-143.0697658691, -449.7116314021), (-138.3840962601, -455.1648422118), (-131.4883627533, -457.2))
        make_face()
    extrude(amount=F19_DEPTH)

    # F17 (on face) → F20 (join)
    with BuildSketch(Plane(origin=(0, 0, -53.594), x_dir=(1, 0, 0), z_dir=(0, 0, -1))):
        with BuildLine():
            ThreePointArc((-959.5405846349, -4.7860807824), (-1016.3281446314, -39.1014502946), (-1038.606, -101.6))
            Line((-1038.606, -101.6), (-1038.606, -175.006))
            Line((-1038.606, -175.006), (-990.6, -175.006))
            Line((-990.6, -175.006), (-990.6, -101.6))
            ThreePointArc((-990.6, -101.6), (-978.6978071313, -68.9258420097), (-948.5684803002, -51.5624765478))
            Line((-948.5684803002, -51.5624765478), (-457.2, 34.544))
            Line((-457.2, 34.544), (-419.1, 34.544))
            Line((-419.1, 34.544), (-419.1, 105.156))
            Line((-419.1, 105.156), (-457.2, 105.156))
            Line((-457.2, 105.156), (-457.2, 105.0798))
            Line((-457.2, 105.0798), (-959.5405846349, -4.7860807824))
        make_face()
    extrude(amount=-F20_DEPTH)

    # F21 (on face) → F22 (join)
    with BuildSketch(Plane.YZ):
        with BuildLine():
            Line((0, -2.794), (-31.75, -2.794))
            Line((-31.75, -2.794), (-31.75, -457.2))
            Line((-31.75, -457.2), (-12.7, -457.2))
            ThreePointArc((-12.7, -457.2), (-3.7197438789, -453.4802561211), (0, -444.5))
            Line((0, -444.5), (0, -2.794))
        make_face()
        with BuildLine():
            ThreePointArc((-11.43, -381), (-17.78, -387.35), (-24.13, -381))
            Line((-24.13, -381), (-24.13, -365.125))
            ThreePointArc((-24.13, -365.125), (-17.78, -358.775), (-11.43, -365.125))
            Line((-11.43, -365.125), (-11.43, -381))
        make_face(mode=Mode.SUBTRACT)
        with BuildLine():
            ThreePointArc((-24.13, -265.43), (-17.78, -259.08), (-11.43, -265.43))
            Line((-11.43, -265.43), (-11.43, -281.305))
            ThreePointArc((-11.43, -281.305), (-17.78, -287.655), (-24.13, -281.305))
            Line((-24.13, -281.305), (-24.13, -265.43))
        make_face(mode=Mode.SUBTRACT)
        with BuildLine():
            ThreePointArc((-24.13, -152.0825), (-17.78, -145.7325), (-11.43, -152.0825))
            Line((-11.43, -152.0825), (-11.43, -167.9575))
            ThreePointArc((-11.43, -167.9575), (-17.78, -174.3075), (-24.13, -167.9575))
            Line((-24.13, -167.9575), (-24.13, -152.0825))
        make_face(mode=Mode.SUBTRACT)
        with BuildLine():
            ThreePointArc((-24.13, -52.3875), (-17.78, -46.0375), (-11.43, -52.3875))
            Line((-11.43, -52.3875), (-11.43, -68.2625))
            ThreePointArc((-11.43, -68.2625), (-17.78, -74.6125), (-24.13, -68.2625))
            Line((-24.13, -68.2625), (-24.13, -52.3875))
        make_face(mode=Mode.SUBTRACT)
    extrude(amount=-F22_DEPTH)

    # F23 (on face) → F24 (join)
    with BuildSketch(Plane(origin=(0, -31.75, 0), x_dir=(-1, 0, 0), z_dir=(0, 1, 0))):
        with BuildLine():
            Line((106.0883627533, -457.2), (131.4883627533, -457.2))
            ThreePointArc((131.4883627533, -457.2), (138.3840962601, -455.1648422118), (143.0697658691, -449.7116314021))
            Line((143.0697658691, -449.7116314021), (254.3558908457, -202.4091314541))
            Line((254.3558908457, -202.4091314541), (251.8079821602, -201.2625725456))
            Line((251.8079821602, -201.2625725456), (140.5218571836, -448.5650724936))
            ThreePointArc((140.5218571836, -448.5650724936), (136.8670348886, -452.8185769252), (131.4883627533, -454.406))
            Line((131.4883627533, -454.406), (106.0883627533, -454.406))
            Line((106.0883627533, -454.406), (106.0883627533, -457.2))
        make_face()
    extrude(amount=F24_DEPTH)

    # F25 (on face) → F26 (cut)
    with BuildSketch(Plane(origin=(-287.2681912682, 0, -129.2706860707), x_dir=(0, -1, 0), z_dir=(-0.9119215052, 0, -0.4103646773))):
        with BuildLine():
            Line((-180.975, -105.6025667432), (-161.925, -105.6025667432))
            ThreePointArc((-161.925, -105.6025667432), (-155.575, -99.2525667432), (-161.925, -92.9025667432))
            Line((-161.925, -92.9025667432), (-180.975, -92.9025667432))
            ThreePointArc((-180.975, -92.9025667432), (-187.325, -99.2525667432), (-180.975, -105.6025667432))
        make_face()
        with BuildLine():
            Line((-161.925, -258.0025667432), (-180.975, -258.0025667432))
            ThreePointArc((-180.975, -258.0025667432), (-187.325, -264.3525667432), (-180.975, -270.7025667432))
            Line((-180.975, -270.7025667432), (-161.925, -270.7025667432))
            ThreePointArc((-161.925, -270.7025667432), (-155.575, -264.3525667432), (-161.925, -258.0025667432))
        make_face()
        with BuildLine():
            Line((19.05, -92.9025667432), (0, -92.9025667432))
            ThreePointArc((0, -92.9025667432), (-6.35, -99.2525667432), (0, -105.6025667432))
            Line((0, -105.6025667432), (19.05, -105.6025667432))
            ThreePointArc((19.05, -105.6025667432), (25.4, -99.2525667432), (19.05, -92.9025667432))
        make_face()
        with BuildLine():
            Line((15.875, -258.0025667432), (0, -258.0025667432))
            ThreePointArc((0, -258.0025667432), (-6.35, -264.3525667432), (0, -270.7025667432))
            Line((0, -270.7025667432), (15.875, -270.7025667432))
            ThreePointArc((15.875, -270.7025667432), (22.225, -264.3525667432), (15.875, -258.0025667432))
        make_face()
    extrude(amount=-F26_DEPTH, mode=Mode.SUBTRACT)

    # F27
    f27_edges = [f1.edges().sort_by_distance(p)[0] for p in [
        (0, -34.544, -228.6),
    ]]
    fillet(f27_edges, radius=F27_R)


solid = f1.part
